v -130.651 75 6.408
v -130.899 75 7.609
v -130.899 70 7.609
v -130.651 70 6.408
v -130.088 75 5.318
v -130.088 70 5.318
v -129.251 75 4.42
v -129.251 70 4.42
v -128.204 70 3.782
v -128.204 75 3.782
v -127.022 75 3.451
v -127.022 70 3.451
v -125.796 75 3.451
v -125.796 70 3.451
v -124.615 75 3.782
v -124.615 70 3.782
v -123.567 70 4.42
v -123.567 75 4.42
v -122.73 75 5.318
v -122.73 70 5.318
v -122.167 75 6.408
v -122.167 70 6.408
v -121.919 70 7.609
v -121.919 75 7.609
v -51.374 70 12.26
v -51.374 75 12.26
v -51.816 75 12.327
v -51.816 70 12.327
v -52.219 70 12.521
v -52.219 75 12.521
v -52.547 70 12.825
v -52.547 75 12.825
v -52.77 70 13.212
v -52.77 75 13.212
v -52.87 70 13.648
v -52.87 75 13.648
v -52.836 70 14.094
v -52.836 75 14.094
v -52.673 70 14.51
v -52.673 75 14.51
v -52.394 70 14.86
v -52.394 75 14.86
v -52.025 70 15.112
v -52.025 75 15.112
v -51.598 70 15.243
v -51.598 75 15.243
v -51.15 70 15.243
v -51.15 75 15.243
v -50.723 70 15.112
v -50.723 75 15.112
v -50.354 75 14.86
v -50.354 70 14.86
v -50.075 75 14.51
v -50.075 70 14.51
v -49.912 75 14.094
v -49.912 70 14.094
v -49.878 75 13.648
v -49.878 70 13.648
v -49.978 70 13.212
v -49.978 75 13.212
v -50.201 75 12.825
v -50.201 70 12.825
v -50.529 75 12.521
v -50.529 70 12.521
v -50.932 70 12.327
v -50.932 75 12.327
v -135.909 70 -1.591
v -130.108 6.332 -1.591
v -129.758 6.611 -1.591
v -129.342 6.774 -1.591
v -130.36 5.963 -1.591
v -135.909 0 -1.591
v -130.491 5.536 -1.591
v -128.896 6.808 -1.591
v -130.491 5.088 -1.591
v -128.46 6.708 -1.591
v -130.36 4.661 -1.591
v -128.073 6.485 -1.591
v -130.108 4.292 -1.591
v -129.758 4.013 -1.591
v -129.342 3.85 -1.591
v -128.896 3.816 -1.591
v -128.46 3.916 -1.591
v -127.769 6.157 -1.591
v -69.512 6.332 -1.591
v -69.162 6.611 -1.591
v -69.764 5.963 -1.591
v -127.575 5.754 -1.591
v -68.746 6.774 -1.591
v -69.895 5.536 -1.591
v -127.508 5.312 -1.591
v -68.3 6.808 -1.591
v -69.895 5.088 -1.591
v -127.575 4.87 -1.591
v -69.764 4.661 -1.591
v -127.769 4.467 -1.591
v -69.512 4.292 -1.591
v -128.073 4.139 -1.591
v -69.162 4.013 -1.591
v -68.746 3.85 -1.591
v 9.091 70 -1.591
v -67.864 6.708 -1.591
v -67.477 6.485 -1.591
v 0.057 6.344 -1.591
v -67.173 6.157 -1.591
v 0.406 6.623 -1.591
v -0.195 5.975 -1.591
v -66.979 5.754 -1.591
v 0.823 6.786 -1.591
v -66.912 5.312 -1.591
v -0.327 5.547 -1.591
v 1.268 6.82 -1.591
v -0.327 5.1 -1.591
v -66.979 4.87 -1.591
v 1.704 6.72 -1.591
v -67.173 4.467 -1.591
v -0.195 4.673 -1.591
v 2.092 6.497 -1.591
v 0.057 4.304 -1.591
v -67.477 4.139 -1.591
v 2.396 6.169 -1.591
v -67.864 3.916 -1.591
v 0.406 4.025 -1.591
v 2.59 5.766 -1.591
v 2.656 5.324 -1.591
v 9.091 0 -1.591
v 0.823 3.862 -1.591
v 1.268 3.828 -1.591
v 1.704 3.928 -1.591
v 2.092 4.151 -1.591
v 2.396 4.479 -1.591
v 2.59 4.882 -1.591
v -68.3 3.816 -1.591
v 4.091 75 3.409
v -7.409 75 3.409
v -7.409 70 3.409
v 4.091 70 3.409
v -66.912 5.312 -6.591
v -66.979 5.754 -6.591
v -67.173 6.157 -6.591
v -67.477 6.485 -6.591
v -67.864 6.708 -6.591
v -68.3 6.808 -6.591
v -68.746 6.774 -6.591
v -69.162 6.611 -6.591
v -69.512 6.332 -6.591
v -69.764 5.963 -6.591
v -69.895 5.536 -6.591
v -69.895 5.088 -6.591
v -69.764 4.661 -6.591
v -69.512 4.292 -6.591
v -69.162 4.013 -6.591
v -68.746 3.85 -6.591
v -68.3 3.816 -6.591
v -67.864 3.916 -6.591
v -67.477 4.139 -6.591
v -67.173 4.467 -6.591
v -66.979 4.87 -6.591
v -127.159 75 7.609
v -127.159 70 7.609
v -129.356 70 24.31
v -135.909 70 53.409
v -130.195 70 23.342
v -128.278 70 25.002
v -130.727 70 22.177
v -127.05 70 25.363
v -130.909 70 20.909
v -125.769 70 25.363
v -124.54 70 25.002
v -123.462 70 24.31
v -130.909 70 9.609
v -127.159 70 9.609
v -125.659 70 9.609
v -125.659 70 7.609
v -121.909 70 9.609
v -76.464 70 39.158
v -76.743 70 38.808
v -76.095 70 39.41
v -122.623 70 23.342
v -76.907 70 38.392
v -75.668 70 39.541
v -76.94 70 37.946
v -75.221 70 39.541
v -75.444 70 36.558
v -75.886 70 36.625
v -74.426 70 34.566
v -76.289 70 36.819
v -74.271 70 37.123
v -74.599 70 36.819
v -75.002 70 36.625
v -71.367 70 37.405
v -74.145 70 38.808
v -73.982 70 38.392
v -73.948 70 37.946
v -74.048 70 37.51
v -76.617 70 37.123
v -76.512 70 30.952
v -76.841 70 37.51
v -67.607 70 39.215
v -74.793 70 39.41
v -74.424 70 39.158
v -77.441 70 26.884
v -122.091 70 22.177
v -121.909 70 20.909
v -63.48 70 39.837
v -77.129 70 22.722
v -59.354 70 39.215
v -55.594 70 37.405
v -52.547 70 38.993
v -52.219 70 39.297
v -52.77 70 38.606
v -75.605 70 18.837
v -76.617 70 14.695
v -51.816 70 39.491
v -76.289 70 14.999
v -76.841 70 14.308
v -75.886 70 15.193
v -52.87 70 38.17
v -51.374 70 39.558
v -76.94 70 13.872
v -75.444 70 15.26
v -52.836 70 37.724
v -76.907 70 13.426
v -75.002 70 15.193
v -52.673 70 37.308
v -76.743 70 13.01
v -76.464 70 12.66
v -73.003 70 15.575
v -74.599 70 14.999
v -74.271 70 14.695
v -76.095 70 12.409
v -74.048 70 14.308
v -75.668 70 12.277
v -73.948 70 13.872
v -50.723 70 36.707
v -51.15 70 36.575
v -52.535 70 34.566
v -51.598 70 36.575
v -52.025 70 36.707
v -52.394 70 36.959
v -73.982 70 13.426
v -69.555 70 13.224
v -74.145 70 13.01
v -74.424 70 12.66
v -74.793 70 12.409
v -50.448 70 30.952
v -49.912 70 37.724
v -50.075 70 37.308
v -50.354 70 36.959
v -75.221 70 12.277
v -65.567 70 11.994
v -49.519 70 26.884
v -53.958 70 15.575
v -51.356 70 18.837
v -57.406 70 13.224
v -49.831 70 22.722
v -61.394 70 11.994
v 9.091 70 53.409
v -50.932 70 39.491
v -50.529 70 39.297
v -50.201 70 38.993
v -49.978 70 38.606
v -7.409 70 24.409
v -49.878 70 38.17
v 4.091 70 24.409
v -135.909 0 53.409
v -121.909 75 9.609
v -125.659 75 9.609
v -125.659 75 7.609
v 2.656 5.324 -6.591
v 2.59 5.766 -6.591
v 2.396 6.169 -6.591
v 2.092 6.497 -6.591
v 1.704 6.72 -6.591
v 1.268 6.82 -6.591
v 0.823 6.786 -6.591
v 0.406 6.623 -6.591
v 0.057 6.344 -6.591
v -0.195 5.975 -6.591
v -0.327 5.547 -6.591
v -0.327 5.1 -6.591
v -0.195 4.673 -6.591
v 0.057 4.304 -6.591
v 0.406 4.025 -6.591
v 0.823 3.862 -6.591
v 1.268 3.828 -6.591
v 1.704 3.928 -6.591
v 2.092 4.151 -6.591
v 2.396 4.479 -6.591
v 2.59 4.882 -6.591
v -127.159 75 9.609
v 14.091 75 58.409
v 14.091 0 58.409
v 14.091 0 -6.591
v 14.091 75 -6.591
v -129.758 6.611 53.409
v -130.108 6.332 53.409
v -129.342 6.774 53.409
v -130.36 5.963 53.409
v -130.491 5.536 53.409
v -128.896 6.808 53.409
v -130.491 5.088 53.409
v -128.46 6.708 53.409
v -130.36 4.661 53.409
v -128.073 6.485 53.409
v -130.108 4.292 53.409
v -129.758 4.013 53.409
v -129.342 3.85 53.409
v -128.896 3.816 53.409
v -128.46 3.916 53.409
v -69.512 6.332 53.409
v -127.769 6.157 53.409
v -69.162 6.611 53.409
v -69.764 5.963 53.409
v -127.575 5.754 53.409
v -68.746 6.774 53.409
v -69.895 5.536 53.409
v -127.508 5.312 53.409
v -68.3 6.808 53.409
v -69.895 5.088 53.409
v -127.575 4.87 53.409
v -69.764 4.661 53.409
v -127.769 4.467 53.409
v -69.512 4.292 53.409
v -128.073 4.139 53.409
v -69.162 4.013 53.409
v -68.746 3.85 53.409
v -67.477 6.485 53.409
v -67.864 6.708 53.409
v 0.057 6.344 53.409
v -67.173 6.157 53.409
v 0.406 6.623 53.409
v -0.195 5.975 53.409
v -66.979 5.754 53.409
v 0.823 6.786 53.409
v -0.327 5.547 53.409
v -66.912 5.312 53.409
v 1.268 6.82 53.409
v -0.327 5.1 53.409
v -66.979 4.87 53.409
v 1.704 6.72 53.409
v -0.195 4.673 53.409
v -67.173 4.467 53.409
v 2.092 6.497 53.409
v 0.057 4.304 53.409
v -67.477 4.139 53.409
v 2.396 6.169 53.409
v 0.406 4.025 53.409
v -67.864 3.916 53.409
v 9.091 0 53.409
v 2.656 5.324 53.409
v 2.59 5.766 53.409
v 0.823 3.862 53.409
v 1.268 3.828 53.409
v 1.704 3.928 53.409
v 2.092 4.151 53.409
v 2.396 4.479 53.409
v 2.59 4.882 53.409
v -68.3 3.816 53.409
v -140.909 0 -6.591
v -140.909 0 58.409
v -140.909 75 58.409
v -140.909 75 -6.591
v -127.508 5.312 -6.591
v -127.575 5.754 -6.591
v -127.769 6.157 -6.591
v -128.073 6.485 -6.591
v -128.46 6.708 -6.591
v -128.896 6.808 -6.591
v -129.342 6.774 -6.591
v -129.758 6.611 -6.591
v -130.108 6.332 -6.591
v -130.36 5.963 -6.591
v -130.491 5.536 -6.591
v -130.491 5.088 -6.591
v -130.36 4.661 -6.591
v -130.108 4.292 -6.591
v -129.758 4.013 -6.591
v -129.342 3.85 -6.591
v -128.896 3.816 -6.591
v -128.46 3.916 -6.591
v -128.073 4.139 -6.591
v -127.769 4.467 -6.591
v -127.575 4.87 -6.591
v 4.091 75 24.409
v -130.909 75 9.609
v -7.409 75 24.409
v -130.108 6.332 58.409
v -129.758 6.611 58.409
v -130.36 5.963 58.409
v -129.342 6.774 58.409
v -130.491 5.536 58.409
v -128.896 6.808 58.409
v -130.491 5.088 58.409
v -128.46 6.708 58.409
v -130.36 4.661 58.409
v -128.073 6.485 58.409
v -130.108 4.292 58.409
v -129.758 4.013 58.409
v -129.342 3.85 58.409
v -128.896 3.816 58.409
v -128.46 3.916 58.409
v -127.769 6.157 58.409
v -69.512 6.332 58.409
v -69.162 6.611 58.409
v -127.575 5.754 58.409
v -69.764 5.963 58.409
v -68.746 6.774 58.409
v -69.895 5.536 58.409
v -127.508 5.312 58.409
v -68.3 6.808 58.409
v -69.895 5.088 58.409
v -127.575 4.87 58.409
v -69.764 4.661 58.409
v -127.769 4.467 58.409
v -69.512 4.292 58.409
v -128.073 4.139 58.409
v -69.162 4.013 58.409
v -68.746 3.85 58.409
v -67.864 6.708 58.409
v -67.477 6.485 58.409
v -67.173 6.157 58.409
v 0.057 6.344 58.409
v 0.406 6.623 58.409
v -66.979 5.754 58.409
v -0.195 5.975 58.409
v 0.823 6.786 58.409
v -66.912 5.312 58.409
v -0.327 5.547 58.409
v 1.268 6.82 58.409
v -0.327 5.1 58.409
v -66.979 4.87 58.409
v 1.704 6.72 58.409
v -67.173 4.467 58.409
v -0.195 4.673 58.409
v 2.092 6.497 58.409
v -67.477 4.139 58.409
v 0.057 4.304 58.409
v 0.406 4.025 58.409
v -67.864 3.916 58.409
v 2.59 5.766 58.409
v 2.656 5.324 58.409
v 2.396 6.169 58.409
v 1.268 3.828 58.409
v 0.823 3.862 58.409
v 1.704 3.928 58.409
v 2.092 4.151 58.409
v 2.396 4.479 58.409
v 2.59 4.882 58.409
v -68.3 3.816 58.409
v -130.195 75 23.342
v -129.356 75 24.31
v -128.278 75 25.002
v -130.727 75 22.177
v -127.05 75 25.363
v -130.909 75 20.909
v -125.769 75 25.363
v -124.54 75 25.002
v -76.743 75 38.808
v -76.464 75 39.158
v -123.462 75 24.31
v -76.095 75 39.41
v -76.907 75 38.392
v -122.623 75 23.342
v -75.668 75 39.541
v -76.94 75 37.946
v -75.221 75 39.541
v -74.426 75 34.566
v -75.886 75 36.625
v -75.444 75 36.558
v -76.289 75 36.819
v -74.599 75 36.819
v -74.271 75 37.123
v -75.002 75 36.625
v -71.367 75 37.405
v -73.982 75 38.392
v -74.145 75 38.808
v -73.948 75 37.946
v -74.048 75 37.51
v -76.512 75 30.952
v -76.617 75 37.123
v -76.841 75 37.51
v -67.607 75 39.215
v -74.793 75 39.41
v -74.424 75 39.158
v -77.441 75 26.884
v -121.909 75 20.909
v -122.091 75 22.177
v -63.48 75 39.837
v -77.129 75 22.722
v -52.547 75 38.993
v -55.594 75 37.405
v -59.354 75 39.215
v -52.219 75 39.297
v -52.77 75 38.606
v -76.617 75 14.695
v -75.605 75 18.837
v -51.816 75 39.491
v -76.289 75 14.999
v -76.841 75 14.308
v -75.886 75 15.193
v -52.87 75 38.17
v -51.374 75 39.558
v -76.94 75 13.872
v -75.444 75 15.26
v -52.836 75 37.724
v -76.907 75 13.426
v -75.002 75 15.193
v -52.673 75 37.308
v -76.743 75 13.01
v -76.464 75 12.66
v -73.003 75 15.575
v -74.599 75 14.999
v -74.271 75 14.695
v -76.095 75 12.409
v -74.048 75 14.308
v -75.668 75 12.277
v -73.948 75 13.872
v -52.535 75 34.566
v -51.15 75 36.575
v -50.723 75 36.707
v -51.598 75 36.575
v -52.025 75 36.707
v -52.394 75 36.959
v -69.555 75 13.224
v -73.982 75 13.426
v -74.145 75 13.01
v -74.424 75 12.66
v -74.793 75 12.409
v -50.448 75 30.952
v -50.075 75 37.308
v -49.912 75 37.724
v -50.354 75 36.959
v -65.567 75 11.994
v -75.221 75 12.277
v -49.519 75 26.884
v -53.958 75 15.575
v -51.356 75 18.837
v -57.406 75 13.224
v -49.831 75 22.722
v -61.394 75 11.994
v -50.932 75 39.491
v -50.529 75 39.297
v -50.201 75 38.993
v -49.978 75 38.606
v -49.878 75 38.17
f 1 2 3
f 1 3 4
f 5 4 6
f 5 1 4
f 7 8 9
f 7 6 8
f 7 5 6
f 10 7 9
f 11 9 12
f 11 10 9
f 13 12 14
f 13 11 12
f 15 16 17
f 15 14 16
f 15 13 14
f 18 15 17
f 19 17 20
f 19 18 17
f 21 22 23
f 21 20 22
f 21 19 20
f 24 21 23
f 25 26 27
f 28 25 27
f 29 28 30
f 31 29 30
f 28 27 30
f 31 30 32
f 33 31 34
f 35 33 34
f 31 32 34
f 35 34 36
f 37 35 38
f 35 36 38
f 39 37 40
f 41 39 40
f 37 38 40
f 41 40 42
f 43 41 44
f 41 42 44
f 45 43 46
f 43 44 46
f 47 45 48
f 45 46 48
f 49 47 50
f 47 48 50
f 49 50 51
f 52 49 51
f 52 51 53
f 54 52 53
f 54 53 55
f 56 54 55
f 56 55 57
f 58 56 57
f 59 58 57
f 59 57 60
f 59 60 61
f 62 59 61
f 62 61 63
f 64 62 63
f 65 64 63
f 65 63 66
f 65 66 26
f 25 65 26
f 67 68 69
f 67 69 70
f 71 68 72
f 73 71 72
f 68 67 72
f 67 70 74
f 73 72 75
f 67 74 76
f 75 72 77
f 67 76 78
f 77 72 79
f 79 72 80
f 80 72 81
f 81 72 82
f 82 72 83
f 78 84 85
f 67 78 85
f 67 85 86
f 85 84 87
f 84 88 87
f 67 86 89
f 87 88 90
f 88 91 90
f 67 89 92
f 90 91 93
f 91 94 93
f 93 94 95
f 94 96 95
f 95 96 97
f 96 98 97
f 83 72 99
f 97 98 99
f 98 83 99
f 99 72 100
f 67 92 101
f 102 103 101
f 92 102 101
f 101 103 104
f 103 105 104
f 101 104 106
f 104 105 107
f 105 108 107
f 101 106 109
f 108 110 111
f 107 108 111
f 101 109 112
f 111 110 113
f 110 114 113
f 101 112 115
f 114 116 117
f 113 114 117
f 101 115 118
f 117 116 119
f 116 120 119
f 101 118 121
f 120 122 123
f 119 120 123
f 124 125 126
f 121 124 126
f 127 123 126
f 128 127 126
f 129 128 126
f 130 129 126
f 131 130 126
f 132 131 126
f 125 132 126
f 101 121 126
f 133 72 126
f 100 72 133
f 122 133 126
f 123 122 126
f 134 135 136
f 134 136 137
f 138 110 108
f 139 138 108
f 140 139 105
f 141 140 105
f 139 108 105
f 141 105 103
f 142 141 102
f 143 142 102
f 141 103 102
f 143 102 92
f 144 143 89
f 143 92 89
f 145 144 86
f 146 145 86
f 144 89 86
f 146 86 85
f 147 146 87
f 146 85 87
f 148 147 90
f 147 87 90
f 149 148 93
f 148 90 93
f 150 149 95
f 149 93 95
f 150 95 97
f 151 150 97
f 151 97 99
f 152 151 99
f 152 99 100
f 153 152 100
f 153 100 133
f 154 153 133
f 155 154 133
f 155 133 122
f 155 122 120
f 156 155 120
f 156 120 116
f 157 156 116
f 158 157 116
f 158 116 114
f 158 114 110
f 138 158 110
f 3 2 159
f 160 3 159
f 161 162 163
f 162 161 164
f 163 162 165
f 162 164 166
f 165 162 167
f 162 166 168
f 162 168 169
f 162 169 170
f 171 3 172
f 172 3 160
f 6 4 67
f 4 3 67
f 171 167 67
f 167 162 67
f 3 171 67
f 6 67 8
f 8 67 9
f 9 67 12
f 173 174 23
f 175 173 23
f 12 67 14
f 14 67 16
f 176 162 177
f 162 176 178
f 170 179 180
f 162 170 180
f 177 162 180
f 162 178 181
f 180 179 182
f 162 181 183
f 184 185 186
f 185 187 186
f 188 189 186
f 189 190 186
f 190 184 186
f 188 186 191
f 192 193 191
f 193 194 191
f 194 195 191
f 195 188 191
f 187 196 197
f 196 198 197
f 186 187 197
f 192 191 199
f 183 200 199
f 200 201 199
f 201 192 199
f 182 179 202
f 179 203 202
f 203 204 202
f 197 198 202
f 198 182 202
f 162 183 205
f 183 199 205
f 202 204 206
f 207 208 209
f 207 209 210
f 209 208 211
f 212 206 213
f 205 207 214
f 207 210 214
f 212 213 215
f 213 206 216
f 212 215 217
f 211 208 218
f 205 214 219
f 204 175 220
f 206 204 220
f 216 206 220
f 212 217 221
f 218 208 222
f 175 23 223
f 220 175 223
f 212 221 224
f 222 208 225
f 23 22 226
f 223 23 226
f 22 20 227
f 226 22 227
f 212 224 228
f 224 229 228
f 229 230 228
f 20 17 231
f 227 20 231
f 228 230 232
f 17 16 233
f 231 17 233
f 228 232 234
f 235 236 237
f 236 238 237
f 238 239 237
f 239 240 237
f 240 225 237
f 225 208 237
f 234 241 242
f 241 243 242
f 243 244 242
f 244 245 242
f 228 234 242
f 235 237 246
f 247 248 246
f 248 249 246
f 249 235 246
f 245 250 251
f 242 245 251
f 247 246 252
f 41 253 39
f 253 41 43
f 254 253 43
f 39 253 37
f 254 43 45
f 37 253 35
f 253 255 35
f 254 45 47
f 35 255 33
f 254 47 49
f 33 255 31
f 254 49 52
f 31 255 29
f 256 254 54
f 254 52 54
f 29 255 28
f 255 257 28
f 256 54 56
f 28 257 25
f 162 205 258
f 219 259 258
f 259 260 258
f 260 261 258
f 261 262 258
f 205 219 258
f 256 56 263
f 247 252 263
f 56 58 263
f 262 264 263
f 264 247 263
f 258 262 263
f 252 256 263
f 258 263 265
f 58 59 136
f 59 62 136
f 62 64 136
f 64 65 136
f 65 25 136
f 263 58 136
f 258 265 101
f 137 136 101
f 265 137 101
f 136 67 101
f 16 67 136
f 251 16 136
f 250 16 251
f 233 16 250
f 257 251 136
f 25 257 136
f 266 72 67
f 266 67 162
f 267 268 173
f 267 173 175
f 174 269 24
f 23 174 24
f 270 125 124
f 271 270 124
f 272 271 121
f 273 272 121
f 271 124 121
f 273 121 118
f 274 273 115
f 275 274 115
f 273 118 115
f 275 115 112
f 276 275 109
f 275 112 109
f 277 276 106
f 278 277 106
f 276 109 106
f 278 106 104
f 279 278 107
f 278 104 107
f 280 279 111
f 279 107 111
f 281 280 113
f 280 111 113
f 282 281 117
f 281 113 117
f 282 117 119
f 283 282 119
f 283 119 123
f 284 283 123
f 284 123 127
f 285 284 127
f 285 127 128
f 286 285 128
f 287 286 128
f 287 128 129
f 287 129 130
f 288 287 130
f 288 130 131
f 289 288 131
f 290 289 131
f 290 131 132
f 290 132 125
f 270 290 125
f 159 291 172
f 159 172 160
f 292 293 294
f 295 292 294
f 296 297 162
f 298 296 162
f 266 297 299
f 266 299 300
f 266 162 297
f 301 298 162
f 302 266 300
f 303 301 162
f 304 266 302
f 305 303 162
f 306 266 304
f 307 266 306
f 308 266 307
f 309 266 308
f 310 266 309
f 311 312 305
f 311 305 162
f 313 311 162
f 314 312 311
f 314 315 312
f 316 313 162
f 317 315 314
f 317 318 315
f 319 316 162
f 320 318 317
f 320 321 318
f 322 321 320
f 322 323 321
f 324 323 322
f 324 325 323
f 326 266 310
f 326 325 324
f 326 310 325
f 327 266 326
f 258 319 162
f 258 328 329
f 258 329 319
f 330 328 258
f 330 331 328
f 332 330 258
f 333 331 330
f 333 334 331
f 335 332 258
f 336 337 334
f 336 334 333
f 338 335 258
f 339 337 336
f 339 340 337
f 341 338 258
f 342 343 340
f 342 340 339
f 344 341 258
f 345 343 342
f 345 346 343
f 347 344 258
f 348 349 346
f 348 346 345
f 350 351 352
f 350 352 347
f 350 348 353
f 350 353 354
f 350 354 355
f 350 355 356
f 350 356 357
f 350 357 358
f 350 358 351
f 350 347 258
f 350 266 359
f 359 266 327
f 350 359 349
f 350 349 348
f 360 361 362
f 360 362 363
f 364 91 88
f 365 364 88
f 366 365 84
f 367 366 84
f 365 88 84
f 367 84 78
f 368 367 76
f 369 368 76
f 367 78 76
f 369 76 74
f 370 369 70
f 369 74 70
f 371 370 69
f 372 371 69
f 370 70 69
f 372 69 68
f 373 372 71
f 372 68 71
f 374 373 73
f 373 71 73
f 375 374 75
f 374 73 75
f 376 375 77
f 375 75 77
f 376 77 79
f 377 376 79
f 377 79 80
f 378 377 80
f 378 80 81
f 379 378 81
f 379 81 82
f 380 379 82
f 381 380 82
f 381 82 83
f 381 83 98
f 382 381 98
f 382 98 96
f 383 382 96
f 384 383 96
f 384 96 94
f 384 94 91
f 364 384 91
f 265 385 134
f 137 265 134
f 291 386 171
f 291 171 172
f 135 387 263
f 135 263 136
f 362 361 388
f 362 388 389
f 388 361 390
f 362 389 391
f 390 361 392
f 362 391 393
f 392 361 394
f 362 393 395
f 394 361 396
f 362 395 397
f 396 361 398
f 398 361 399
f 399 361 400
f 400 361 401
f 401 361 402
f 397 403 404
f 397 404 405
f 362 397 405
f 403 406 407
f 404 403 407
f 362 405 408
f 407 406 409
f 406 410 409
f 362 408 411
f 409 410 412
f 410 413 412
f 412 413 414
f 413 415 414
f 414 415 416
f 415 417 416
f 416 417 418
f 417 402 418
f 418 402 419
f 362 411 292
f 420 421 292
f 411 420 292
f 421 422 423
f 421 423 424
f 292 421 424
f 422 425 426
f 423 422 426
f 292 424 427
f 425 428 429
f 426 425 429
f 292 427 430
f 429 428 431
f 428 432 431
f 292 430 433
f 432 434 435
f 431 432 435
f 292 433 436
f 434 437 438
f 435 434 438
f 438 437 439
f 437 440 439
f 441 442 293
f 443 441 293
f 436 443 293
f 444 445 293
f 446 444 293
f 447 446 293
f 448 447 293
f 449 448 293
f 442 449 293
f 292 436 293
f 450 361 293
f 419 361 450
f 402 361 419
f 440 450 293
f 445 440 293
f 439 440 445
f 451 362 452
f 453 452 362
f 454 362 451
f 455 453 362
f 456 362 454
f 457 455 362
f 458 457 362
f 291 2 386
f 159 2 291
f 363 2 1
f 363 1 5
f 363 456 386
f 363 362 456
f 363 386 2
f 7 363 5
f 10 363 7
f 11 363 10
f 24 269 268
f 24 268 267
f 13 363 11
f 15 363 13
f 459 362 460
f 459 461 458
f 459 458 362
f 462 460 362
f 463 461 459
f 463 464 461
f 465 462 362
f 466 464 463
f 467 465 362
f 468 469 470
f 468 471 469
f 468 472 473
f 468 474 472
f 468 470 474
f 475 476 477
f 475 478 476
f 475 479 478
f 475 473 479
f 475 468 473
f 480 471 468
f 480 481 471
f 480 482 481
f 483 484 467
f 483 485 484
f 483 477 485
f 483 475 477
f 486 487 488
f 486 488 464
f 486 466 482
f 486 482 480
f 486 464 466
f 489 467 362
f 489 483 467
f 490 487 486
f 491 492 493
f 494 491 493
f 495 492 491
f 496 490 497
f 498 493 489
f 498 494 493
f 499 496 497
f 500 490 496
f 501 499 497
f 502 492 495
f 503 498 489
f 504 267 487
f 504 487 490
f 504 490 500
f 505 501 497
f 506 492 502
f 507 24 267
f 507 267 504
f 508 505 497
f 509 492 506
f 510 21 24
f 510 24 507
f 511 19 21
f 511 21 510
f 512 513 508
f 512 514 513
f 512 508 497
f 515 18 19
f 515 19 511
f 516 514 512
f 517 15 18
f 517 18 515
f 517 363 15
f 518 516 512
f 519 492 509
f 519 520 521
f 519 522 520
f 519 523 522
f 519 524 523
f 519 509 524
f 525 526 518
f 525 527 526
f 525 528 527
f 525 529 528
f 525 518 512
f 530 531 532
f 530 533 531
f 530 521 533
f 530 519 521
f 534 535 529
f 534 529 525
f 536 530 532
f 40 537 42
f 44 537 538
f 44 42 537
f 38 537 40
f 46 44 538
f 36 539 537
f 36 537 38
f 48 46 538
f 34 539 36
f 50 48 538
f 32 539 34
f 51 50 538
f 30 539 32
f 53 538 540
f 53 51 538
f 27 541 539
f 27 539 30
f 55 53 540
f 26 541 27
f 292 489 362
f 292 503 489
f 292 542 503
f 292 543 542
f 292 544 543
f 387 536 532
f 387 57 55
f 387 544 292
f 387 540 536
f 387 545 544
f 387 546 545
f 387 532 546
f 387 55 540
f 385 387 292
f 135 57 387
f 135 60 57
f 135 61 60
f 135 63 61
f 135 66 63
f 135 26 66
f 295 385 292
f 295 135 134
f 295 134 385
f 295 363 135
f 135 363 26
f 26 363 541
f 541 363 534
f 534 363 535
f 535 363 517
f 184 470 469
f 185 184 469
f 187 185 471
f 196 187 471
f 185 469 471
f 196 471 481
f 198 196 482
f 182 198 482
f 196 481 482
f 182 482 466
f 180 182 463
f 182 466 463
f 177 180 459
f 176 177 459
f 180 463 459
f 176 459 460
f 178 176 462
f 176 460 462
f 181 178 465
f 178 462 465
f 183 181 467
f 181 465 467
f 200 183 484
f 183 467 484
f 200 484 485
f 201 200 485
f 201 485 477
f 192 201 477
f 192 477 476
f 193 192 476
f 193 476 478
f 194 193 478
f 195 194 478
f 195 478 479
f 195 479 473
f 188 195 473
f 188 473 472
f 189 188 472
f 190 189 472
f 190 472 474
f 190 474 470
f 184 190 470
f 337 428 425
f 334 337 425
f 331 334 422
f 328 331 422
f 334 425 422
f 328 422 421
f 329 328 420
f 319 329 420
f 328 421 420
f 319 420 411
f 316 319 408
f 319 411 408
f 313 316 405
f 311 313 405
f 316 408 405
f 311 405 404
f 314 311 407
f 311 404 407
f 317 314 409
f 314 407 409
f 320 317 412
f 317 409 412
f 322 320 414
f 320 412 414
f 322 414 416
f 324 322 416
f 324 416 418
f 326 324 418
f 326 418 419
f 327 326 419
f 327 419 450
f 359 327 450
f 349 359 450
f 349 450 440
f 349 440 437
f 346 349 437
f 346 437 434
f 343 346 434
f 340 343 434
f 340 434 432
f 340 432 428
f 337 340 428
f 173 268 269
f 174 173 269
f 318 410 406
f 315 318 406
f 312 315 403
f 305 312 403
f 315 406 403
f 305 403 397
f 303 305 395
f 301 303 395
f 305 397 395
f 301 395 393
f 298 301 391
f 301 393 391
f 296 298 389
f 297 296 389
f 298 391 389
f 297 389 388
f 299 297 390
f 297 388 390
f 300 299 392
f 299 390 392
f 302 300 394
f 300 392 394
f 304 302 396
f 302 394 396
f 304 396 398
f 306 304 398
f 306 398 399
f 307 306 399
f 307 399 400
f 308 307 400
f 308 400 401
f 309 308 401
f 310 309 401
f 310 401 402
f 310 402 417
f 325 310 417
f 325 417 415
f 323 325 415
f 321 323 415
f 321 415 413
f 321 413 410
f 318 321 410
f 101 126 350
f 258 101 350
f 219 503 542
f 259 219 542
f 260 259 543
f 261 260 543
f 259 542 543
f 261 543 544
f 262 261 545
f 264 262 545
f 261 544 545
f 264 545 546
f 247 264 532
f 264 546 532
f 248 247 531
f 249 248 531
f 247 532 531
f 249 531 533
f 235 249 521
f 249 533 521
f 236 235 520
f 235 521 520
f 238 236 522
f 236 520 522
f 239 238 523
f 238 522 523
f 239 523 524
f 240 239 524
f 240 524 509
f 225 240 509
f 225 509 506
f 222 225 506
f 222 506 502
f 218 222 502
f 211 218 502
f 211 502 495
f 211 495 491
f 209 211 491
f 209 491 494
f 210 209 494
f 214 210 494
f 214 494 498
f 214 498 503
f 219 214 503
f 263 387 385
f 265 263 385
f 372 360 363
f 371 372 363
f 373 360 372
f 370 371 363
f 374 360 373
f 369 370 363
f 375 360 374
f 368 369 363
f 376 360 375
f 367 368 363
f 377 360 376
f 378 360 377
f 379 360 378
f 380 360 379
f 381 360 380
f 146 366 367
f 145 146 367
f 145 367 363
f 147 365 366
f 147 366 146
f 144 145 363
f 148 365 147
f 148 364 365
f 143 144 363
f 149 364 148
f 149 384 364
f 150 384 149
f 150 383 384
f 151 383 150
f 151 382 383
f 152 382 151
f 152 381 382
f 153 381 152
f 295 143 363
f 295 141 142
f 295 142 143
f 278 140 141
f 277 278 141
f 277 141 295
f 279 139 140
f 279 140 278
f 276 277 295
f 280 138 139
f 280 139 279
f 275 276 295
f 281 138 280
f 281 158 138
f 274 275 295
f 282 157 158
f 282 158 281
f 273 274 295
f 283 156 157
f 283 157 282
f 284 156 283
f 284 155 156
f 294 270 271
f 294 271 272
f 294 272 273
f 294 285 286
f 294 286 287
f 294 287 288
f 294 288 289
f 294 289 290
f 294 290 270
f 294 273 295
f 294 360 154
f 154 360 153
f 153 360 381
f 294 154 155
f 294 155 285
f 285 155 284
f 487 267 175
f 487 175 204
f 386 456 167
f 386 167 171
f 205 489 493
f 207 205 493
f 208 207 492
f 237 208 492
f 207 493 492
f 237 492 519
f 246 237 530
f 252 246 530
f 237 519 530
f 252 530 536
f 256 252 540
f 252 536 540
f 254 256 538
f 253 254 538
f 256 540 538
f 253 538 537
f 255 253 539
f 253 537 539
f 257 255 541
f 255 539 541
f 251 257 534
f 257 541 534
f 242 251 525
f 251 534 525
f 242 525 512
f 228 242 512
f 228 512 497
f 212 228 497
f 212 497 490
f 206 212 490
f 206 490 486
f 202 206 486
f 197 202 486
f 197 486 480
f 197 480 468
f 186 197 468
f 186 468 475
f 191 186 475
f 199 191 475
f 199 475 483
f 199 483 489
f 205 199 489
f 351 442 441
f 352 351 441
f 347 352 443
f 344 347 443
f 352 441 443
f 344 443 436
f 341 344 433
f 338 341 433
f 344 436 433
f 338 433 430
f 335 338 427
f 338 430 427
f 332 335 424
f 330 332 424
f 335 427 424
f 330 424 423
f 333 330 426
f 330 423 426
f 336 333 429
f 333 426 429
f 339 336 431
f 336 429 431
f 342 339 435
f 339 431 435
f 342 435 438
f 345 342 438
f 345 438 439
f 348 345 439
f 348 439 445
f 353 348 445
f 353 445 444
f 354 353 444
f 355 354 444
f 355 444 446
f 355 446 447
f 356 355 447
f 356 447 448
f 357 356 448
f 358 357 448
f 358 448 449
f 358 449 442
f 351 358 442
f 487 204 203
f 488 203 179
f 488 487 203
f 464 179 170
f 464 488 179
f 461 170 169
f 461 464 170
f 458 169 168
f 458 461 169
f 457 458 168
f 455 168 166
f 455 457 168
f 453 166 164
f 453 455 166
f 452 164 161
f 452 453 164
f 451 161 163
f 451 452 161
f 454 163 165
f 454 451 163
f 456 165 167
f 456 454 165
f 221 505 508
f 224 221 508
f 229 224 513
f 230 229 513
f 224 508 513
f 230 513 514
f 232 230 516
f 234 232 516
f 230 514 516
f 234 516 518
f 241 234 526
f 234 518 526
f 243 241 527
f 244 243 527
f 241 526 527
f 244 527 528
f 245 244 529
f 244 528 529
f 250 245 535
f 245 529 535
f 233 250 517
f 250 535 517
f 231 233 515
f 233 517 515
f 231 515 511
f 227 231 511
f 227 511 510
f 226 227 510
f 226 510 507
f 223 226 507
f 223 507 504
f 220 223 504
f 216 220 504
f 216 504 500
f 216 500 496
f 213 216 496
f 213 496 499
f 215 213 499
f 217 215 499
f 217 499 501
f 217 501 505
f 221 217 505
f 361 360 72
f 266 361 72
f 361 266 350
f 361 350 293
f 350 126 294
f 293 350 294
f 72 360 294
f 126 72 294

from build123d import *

# Parameters (mm, degrees)
SKETCH1_W           = 155
SKETCH1_H           = 65
BOSS_EXTRUDE2_DEPTH = 75
SKETCH2_W           = 145
SKETCH2_H           = 55
CUT_EXTRUDE1_DEPTH  = 70
SKETCH3_R           = 14
SKETCH3_R_2         = 1.5
SKETCH3_W           = 11.5
SKETCH3_H           = 21
CUT_EXTRUDE2_DEPTH  = 70
SKETCH5_R           = 1.5
CUT_EXTRUDE3_DEPTH  = 73
SKETCH6_W           = 3.75
SKETCH6_H           = 2
BOSS_EXTRUDE3_DEPTH = 5


with BuildPart() as part:
    # Sketch1 → Boss-Extrude2 (new body)
    with BuildSketch(Plane(origin=(0, 0, 0), x_dir=(1, 0, 0), z_dir=(0, 1, 0))):
        with Locations((-63.409090909, -25.909090909)):
            Rectangle(SKETCH1_W, SKETCH1_H)
    extrude(amount=BOSS_EXTRUDE2_DEPTH)

    # Sketch2 → Cut-Extrude1 (cut)
    with BuildSketch(Plane.XZ):
        with Locations((-63.409090909, 25.909090909)):
            Rectangle(SKETCH2_W, SKETCH2_H)
    extrude(amount=-CUT_EXTRUDE1_DEPTH, mode=Mode.SUBTRACT)

    # Sketch3 → Cut-Extrude2 (cut)
    with BuildSketch(Plane(origin=(0, 75, 0), x_dir=(1, 0, 0), z_dir=(0, 1, 0))):
        with Locations(Location((-63.480160731, -25.837348529, 0), (0, 0, 270))):
            Circle(SKETCH3_R)
        with Locations(Location((-75.444232667, -13.760056502, 0), (0, 0, 270))):
            Circle(SKETCH3_R_2)
        with Locations(Location((-51.373949151, -13.760056502, 0), (0, 0, 90))):
            Circle(SKETCH3_R_2)
        with Locations(Location((-51.373949151, -38.058125316, 0), (0, 0, 270))):
            Circle(SKETCH3_R_2)
        with Locations(Location((-75.444232667, -38.058125316, 0), (0, 0, 90))):
            Circle(SKETCH3_R_2)
        with BuildLine():
            Line((-121.909090909, -7.909090909), (-121.909090909, -20.909090909))
            ThreePointArc((-121.909090909, -20.909090909), (-126.409090909, -25.409090909), (-130.909090909, -20.909090909))
            Line((-130.909090909, -20.909090909), (-130.909090909, -7.909090909))
            ThreePointArc((-130.909090909, -7.909090909), (-126.409090909, -3.409090909), (-121.909090909, -7.909090909))
        make_face()
        with Locations((-1.659090909, -13.909090909)):
            Rectangle(SKETCH3_W, SKETCH3_H)
    extrude(amount=-CUT_EXTRUDE2_DEPTH, mode=Mode.SUBTRACT)

    # Sketch5 → Cut-Extrude3 (cut)
    with BuildSketch(Plane.XY.offset(58.409090909)):
        with Locations((-68.4120524, 5.312033368)):
            Circle(SKETCH5_R)
        with Locations((1.156357058, 5.323906477)):
            Circle(SKETCH5_R)
        with Locations((-129.008167682, 5.312033368)):
            Circle(SKETCH5_R)
    extrude(amount=-CUT_EXTRUDE3_DEPTH, mode=Mode.SUBTRACT)

    # Sketch6 → Boss-Extrude3 (add)
    with BuildSketch(Plane(origin=(0, 75, 0), x_dir=(1, 0, 0), z_dir=(0, 1, 0))):
        with Locations((-129.034090909, -8.609090909)):
            Rectangle(SKETCH6_W, SKETCH6_H)
        with Locations((-123.784090909, -8.609090909)):
            Rectangle(SKETCH6_W, SKETCH6_H)
    extrude(amount=-BOSS_EXTRUDE3_DEPTH)


solid = part.part
